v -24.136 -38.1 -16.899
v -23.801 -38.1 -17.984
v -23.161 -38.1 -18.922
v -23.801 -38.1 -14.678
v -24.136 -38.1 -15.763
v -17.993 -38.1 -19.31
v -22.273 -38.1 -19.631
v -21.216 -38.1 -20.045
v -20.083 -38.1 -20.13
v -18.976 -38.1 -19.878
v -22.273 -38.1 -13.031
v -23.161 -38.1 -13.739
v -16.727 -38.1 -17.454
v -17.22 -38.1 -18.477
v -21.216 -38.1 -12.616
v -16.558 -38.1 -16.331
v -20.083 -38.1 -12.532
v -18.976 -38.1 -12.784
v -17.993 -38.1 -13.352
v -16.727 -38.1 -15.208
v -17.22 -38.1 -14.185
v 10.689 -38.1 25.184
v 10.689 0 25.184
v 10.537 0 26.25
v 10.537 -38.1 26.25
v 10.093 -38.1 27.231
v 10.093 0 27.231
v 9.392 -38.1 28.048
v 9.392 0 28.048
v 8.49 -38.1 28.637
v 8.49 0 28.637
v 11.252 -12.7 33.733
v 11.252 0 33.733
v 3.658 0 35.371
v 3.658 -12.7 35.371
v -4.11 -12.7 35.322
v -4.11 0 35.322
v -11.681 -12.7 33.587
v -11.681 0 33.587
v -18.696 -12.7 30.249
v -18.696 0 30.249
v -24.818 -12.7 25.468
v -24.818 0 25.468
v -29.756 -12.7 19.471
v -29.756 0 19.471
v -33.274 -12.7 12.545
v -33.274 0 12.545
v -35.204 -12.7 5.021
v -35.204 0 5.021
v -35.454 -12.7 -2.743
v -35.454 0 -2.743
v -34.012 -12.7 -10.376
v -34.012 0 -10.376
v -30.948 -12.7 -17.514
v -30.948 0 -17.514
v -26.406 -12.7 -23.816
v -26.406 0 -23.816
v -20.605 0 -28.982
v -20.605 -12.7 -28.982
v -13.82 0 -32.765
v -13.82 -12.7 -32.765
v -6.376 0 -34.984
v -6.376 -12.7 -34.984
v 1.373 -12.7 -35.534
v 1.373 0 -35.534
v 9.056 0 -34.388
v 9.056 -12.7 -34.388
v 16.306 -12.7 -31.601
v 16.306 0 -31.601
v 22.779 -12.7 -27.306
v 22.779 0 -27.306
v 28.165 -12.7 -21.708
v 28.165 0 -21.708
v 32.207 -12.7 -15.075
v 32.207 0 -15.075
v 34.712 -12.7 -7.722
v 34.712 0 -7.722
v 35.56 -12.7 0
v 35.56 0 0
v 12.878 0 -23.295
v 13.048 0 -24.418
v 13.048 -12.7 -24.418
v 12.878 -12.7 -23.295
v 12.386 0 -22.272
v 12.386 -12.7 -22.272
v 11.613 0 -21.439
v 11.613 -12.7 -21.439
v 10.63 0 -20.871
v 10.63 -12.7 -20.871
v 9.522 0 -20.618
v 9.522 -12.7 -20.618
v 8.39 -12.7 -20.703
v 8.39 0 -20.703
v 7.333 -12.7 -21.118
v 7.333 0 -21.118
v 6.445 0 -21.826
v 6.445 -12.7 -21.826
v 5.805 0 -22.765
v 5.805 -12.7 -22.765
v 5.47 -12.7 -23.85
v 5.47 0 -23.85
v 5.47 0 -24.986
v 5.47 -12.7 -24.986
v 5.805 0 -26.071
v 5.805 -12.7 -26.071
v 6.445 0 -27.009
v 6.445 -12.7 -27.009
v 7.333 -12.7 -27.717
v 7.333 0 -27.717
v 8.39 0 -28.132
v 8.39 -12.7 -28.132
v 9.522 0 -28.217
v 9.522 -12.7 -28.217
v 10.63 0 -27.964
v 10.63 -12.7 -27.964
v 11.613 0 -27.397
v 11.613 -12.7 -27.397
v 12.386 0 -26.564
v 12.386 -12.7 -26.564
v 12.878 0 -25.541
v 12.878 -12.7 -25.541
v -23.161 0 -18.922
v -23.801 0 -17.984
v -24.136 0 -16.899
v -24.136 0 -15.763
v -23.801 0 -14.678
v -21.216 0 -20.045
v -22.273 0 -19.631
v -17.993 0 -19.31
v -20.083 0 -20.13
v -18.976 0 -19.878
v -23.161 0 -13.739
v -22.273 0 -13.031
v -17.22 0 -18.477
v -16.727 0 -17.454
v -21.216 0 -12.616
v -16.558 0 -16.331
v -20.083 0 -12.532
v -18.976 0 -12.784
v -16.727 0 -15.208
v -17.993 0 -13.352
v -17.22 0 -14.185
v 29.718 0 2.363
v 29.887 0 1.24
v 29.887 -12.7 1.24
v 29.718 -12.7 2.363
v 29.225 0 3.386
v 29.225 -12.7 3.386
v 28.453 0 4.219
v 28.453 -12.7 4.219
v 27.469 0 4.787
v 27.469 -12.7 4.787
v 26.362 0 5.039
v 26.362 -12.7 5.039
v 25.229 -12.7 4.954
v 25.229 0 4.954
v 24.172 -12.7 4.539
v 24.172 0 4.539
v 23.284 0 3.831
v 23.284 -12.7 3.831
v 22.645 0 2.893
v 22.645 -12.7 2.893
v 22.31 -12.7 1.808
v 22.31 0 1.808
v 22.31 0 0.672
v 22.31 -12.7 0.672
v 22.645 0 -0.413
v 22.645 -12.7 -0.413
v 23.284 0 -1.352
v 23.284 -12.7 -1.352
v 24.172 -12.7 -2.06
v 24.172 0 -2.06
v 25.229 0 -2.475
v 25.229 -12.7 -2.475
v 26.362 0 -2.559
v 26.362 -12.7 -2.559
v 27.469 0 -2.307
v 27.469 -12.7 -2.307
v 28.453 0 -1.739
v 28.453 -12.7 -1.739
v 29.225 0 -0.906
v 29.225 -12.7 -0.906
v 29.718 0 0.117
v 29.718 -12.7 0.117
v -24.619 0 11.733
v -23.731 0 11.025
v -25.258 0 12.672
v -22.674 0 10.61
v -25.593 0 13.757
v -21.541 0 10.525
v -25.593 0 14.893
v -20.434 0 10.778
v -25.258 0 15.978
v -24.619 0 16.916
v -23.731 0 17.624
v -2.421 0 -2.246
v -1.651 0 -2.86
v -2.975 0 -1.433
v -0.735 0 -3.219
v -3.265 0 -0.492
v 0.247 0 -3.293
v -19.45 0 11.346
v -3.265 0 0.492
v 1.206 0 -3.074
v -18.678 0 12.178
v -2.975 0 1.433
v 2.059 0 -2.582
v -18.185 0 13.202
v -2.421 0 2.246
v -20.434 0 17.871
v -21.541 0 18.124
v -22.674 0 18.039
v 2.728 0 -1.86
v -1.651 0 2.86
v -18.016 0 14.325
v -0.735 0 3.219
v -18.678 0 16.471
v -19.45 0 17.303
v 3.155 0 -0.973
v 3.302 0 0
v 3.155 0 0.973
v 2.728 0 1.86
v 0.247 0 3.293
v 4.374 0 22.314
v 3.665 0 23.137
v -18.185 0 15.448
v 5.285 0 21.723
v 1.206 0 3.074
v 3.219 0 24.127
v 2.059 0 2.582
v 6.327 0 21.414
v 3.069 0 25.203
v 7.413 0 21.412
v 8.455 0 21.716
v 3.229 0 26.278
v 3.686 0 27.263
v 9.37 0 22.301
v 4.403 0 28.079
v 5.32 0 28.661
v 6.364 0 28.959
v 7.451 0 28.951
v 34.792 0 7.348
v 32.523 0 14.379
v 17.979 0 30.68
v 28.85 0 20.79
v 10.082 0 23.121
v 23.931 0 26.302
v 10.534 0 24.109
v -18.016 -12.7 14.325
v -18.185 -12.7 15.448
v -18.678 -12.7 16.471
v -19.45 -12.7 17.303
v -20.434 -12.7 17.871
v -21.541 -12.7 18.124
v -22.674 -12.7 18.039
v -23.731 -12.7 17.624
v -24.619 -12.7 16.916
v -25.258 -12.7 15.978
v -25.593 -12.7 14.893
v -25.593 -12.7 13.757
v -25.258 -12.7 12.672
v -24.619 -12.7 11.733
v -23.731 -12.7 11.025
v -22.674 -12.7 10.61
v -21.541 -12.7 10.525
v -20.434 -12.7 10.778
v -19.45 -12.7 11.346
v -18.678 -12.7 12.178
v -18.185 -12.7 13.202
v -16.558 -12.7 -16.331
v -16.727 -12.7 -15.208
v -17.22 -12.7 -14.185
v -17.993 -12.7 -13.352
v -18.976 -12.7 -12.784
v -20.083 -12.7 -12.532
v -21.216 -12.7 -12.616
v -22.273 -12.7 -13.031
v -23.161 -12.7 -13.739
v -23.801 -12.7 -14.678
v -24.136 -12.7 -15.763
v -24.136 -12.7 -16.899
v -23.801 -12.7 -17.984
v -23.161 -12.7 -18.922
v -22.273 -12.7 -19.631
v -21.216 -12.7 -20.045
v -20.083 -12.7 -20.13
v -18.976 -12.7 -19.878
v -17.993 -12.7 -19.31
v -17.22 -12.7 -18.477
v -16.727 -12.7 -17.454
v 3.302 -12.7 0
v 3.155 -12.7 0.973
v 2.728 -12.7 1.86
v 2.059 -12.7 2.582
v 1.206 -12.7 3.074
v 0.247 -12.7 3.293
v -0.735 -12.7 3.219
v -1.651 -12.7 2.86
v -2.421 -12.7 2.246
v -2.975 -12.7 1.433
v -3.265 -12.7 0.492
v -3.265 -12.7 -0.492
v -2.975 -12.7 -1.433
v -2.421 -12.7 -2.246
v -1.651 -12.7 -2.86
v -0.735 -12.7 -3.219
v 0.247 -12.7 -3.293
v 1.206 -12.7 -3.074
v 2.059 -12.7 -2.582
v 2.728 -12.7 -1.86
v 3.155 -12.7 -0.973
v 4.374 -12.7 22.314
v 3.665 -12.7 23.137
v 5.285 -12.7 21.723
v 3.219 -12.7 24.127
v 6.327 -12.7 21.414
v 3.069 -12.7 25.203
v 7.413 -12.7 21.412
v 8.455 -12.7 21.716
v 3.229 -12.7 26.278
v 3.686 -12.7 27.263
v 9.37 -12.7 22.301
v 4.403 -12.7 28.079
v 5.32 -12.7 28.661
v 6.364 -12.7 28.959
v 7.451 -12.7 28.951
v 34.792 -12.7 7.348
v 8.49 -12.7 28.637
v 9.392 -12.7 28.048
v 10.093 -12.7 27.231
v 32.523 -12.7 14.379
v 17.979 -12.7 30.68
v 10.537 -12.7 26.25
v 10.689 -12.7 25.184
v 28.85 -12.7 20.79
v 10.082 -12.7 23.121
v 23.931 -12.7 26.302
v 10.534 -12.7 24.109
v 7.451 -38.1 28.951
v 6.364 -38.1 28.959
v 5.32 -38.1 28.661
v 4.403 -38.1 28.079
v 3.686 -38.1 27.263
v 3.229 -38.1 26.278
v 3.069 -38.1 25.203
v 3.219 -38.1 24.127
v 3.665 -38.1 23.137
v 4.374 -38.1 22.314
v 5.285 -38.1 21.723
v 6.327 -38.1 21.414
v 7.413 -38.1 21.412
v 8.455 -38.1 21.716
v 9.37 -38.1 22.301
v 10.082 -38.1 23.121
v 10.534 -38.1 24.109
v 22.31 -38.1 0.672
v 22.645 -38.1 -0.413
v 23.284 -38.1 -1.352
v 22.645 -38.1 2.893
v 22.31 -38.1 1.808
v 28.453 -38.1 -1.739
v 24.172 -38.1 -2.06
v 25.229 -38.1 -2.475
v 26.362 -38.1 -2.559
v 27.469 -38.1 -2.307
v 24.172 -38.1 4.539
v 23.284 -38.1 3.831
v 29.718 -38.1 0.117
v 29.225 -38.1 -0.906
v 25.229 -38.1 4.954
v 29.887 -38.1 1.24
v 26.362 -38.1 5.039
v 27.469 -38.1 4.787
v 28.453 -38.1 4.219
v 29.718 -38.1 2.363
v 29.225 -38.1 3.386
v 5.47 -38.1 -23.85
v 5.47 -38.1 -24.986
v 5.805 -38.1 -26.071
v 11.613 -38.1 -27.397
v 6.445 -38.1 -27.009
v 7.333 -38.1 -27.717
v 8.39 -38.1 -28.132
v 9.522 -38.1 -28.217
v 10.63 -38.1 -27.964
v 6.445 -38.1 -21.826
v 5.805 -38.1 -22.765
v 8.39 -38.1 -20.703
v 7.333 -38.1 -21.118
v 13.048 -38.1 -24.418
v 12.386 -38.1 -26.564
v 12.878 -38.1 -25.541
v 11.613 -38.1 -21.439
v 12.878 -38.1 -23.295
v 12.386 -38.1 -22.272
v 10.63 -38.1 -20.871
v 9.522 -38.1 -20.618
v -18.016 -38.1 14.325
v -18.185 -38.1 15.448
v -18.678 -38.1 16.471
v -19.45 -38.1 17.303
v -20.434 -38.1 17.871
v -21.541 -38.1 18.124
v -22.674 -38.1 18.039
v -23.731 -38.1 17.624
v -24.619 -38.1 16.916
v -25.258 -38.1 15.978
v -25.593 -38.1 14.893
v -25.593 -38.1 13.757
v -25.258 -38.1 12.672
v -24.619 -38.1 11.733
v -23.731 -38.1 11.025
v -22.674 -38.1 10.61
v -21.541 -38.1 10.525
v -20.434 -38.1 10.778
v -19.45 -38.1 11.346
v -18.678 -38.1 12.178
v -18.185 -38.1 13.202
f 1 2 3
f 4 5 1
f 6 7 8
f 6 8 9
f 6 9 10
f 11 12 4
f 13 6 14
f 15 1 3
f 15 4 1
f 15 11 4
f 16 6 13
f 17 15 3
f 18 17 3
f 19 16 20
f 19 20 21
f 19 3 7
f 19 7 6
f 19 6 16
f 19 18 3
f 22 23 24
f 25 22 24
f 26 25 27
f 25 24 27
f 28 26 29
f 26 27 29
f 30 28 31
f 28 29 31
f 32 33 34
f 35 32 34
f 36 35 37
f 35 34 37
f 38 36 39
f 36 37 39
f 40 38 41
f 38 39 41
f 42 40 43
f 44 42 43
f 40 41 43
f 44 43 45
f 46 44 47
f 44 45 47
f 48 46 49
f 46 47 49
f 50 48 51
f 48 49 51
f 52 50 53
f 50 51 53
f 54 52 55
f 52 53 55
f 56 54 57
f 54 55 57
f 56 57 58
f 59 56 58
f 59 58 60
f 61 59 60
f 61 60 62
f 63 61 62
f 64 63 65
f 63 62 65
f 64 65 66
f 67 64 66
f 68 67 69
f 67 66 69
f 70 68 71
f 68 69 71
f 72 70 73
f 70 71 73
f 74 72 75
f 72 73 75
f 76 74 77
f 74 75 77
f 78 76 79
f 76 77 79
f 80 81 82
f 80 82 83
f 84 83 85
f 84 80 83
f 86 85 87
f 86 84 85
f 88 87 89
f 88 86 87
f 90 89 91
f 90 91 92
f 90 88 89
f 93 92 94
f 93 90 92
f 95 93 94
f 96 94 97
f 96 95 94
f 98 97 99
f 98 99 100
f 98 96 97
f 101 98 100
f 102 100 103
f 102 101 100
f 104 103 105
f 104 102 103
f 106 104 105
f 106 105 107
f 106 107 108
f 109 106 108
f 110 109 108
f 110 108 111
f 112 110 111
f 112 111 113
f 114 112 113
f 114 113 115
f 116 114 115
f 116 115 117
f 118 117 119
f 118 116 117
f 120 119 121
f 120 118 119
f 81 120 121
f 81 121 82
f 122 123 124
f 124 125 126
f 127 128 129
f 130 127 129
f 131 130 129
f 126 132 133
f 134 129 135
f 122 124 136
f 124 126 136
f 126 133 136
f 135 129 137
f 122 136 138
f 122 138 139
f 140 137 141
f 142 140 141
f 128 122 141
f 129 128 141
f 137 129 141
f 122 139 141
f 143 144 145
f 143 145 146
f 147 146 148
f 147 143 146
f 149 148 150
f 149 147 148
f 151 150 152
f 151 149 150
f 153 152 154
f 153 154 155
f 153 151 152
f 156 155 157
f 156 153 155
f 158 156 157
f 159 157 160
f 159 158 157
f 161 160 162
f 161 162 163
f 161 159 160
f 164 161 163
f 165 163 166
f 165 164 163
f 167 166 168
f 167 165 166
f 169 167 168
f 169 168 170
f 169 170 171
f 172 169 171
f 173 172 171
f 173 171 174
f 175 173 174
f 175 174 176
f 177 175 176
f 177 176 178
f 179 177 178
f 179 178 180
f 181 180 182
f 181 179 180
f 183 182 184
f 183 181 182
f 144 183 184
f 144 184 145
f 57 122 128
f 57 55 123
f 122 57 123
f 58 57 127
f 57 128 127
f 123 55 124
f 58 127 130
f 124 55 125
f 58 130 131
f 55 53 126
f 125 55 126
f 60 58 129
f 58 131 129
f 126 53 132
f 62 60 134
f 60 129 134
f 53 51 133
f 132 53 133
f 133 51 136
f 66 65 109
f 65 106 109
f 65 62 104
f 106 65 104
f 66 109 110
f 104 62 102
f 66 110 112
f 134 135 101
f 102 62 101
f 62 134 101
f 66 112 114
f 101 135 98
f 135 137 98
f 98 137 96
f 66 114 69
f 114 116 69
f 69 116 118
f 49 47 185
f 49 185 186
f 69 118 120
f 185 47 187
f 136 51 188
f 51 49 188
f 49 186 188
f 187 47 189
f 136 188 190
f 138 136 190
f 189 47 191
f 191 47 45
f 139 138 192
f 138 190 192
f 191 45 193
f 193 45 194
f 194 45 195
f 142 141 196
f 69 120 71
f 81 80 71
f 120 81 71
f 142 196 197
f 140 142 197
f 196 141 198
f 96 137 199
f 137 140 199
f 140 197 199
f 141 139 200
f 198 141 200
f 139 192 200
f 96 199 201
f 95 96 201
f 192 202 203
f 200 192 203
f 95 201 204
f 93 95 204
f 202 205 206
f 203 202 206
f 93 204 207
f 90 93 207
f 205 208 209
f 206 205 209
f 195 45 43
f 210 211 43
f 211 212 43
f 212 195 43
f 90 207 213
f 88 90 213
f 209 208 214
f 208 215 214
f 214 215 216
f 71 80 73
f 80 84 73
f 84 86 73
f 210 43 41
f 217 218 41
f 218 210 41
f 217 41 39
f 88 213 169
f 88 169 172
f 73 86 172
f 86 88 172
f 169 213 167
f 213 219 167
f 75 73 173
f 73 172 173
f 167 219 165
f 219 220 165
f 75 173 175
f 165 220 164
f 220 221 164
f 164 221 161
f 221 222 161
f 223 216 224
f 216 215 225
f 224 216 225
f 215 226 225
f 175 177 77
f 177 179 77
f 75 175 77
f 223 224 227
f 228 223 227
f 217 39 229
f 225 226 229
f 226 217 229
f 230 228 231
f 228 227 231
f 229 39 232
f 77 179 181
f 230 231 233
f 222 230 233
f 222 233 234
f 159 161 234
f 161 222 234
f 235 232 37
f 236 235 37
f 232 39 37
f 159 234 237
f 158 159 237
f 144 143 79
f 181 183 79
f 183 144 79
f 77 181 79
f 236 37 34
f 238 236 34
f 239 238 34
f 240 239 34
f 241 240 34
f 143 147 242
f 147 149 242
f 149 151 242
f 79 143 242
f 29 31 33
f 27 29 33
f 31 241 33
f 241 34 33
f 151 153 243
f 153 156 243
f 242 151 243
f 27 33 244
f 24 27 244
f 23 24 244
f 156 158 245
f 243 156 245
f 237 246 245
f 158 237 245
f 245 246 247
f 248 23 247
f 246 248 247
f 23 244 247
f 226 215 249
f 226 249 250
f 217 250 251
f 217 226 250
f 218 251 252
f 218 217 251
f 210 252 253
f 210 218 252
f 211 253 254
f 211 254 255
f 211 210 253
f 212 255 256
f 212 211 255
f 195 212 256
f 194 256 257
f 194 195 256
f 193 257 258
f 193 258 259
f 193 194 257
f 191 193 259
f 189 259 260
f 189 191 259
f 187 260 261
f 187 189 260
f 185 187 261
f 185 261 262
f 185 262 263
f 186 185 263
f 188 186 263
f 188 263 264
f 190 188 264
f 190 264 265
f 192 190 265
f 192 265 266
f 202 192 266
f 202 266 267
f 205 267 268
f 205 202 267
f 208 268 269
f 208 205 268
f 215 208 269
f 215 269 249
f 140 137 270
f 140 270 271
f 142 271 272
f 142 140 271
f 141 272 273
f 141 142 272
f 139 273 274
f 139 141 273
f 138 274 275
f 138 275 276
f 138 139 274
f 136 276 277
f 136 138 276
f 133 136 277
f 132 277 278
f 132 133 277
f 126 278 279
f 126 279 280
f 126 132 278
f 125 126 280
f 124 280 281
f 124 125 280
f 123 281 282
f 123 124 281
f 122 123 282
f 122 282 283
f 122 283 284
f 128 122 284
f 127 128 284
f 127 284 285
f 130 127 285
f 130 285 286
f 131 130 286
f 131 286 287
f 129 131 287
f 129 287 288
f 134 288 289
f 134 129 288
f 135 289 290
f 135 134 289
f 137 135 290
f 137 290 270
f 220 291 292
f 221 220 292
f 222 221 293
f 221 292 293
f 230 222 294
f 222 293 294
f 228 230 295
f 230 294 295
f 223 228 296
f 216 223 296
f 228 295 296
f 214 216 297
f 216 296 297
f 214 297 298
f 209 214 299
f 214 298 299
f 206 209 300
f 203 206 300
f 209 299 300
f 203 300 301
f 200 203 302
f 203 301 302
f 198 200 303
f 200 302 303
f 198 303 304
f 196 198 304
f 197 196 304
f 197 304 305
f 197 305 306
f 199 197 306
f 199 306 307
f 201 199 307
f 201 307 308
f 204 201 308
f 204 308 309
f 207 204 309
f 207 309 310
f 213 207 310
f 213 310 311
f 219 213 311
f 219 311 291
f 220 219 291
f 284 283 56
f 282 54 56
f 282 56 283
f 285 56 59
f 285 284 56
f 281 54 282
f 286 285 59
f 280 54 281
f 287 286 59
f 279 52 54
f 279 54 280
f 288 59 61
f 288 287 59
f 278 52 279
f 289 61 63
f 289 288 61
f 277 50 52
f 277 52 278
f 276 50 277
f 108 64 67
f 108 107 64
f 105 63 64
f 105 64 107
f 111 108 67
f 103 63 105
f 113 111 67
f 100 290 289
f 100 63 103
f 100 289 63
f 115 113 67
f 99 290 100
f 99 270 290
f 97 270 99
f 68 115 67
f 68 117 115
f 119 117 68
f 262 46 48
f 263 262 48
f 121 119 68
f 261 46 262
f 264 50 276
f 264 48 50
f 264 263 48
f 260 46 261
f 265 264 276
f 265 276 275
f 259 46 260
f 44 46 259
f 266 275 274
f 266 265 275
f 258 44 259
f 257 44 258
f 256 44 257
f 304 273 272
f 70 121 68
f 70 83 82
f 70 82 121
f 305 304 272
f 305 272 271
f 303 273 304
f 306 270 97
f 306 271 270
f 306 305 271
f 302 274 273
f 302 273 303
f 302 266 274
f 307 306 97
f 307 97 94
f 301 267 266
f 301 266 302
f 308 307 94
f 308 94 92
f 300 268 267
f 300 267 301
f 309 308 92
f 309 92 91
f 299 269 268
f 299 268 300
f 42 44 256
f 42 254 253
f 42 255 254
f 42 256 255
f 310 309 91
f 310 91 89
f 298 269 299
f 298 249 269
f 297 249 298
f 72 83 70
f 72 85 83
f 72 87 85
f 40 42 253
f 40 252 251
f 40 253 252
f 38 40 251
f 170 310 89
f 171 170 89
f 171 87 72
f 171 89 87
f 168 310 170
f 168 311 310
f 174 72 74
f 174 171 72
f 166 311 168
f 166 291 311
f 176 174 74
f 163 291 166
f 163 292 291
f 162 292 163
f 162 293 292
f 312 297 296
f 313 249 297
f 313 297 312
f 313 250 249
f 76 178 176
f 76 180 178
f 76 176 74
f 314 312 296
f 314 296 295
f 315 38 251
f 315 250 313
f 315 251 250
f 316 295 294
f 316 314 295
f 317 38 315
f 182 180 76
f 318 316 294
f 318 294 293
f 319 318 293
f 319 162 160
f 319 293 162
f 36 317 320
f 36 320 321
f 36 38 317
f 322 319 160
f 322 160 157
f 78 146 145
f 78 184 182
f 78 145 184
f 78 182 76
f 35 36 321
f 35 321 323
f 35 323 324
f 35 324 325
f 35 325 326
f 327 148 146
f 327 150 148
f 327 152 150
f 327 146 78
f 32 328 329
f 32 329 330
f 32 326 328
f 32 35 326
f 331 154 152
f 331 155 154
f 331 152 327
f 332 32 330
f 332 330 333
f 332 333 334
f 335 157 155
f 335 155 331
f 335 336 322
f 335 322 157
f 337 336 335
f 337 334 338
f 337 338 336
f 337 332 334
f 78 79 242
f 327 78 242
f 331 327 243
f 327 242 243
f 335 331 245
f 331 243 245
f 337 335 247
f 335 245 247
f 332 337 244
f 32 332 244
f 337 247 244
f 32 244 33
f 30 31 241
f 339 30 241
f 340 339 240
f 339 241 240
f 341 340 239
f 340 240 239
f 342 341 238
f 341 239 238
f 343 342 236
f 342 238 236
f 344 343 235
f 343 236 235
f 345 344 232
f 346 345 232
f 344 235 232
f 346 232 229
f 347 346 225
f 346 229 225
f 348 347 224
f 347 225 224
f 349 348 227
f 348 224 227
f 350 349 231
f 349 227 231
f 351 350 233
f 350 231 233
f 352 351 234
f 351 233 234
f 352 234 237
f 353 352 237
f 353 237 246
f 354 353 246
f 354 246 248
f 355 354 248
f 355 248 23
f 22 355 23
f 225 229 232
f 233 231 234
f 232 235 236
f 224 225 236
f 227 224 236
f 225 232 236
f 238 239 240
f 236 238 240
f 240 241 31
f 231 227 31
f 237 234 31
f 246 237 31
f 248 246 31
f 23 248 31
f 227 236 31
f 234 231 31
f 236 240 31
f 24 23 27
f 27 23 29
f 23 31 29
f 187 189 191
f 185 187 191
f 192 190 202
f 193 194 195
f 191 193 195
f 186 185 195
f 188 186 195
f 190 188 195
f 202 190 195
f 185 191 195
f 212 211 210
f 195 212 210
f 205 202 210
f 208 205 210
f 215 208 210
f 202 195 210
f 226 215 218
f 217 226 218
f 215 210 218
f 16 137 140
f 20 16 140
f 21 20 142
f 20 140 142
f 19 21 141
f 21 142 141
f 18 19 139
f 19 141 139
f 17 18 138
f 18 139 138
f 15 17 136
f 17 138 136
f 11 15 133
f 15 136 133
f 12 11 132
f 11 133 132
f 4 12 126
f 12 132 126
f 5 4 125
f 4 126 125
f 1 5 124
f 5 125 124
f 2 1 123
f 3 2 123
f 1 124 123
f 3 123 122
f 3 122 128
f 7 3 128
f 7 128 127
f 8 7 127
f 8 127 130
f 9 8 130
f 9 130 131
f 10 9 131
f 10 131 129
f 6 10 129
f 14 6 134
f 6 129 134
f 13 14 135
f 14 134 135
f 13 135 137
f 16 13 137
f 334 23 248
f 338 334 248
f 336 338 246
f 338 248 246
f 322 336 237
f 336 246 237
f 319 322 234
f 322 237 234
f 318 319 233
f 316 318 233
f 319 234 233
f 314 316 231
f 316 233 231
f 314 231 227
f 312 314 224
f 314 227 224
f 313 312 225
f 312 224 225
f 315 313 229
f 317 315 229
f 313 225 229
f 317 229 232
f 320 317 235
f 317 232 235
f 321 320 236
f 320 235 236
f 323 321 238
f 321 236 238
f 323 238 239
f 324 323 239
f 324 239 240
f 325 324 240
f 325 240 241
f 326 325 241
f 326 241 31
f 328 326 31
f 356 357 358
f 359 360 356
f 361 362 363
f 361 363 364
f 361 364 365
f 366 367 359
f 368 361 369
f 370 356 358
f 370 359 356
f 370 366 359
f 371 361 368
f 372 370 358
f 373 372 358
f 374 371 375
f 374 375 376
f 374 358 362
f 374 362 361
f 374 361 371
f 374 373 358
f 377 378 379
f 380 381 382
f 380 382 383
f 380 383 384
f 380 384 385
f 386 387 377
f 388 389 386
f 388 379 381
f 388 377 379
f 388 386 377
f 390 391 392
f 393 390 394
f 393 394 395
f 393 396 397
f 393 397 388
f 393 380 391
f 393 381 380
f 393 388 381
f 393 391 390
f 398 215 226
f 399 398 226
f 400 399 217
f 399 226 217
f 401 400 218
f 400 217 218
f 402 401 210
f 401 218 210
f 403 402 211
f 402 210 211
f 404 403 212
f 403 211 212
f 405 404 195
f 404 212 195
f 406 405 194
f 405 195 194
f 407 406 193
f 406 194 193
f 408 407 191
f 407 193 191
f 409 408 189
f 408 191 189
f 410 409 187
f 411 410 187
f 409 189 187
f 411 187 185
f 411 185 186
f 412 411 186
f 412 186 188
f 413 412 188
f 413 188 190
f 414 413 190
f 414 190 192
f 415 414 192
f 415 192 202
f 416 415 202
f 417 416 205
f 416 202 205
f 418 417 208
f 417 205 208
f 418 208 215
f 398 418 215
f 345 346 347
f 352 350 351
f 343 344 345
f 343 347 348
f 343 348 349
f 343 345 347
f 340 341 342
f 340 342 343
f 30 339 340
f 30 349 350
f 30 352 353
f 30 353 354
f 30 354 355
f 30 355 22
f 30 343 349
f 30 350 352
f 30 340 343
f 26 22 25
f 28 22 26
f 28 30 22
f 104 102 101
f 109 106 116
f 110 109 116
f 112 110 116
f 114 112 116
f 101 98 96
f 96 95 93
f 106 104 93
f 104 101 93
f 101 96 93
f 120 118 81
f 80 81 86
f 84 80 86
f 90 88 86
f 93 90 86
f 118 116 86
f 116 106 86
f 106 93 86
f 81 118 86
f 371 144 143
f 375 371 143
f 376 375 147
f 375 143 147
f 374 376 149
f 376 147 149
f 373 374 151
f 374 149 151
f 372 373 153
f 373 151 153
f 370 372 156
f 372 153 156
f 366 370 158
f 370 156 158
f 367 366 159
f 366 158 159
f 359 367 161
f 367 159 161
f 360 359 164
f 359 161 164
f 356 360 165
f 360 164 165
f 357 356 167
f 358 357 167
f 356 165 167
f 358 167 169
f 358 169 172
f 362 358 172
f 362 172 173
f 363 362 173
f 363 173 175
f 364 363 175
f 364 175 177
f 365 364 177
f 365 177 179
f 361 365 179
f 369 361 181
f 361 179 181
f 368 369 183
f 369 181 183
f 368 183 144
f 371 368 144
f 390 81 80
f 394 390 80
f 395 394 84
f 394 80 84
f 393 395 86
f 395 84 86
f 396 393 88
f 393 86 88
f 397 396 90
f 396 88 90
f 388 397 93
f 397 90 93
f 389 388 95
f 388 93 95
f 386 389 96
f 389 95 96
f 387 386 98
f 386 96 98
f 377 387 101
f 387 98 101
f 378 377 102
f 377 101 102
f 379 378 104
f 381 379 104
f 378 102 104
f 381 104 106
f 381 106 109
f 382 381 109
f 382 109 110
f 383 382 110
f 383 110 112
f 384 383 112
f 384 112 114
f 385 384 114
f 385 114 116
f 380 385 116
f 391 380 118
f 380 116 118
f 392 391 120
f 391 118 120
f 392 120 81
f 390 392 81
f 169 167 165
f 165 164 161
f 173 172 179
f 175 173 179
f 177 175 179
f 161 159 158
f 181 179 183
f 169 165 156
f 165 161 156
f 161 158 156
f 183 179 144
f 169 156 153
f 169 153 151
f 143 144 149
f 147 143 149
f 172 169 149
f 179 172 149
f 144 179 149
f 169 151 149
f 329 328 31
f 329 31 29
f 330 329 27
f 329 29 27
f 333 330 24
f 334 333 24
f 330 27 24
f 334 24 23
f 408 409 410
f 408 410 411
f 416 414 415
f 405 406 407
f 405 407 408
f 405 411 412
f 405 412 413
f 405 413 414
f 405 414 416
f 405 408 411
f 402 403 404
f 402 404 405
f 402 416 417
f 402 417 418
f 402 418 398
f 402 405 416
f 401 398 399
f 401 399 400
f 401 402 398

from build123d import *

# Parameters (mm, degrees)
F0_R     = 3.81
F1_DEPTH = 38.1
F2_DEPTH = 12.7
F3_R     = 3.302
F4_DEPTH = 25.4


with BuildPart() as f1:
    # F0 (on Front) → F1 (new body)
    with BuildSketch(Plane.XZ):
        with Locations((-21.825766, 14.32471)):
            Circle(F0_R)
        with BuildLine():
            ThreePointArc((10.689076, 25.184116), (10.0927, 27.230753), (8.49027, 28.636673))
            ThreePointArc((8.49027, 28.636673), (3.665453, 23.137478), (10.689076, 25.184116))
        make_face()
        with Locations((26.077269, 1.239929)):
            Circle(F0_R)
        with Locations((9.237562, -24.417797)):
            Circle(F0_R)
        with Locations((-20.368141, -16.330958)):
            Circle(F0_R)
    extrude(amount=F1_DEPTH)


with BuildPart() as f2:
    # F0 (on Front) → F2 (new body)
    with BuildSketch(Plane.XZ):
        with BuildLine():
            ThreePointArc((11.251551, 33.733013), (-28.849773, -20.789522), (35.56, 0))
            ThreePointArc((35.56, 0), (28.849773, 20.789522), (11.251551, 33.733013))
        make_face()
        with Locations((-20.368141, -16.330958)):
            Circle(F0_R, mode=Mode.SUBTRACT)
        with Locations((9.237562, -24.417797)):
            Circle(F0_R, mode=Mode.SUBTRACT)
        with Locations((-21.825766, 14.32471)):
            Circle(F0_R, mode=Mode.SUBTRACT)
        with Locations((26.077269, 1.239929)):
            Circle(F0_R, mode=Mode.SUBTRACT)
        with BuildLine():
            ThreePointArc((10.689076, 25.184116), (3.665453, 23.137478), (8.49027, 28.636673))
            ThreePointArc((8.49027, 28.636673), (10.0927, 27.230753), (10.689076, 25.184116))
        make_face(mode=Mode.SUBTRACT)
    extrude(amount=F2_DEPTH)

    # F3 (on face) → F4 (cut)
    with BuildSketch(Plane.XZ.offset(12.7)):
        Circle(F3_R)
    extrude(amount=-F4_DEPTH, mode=Mode.SUBTRACT)


solid = Compound([f1.part, f2.part])
